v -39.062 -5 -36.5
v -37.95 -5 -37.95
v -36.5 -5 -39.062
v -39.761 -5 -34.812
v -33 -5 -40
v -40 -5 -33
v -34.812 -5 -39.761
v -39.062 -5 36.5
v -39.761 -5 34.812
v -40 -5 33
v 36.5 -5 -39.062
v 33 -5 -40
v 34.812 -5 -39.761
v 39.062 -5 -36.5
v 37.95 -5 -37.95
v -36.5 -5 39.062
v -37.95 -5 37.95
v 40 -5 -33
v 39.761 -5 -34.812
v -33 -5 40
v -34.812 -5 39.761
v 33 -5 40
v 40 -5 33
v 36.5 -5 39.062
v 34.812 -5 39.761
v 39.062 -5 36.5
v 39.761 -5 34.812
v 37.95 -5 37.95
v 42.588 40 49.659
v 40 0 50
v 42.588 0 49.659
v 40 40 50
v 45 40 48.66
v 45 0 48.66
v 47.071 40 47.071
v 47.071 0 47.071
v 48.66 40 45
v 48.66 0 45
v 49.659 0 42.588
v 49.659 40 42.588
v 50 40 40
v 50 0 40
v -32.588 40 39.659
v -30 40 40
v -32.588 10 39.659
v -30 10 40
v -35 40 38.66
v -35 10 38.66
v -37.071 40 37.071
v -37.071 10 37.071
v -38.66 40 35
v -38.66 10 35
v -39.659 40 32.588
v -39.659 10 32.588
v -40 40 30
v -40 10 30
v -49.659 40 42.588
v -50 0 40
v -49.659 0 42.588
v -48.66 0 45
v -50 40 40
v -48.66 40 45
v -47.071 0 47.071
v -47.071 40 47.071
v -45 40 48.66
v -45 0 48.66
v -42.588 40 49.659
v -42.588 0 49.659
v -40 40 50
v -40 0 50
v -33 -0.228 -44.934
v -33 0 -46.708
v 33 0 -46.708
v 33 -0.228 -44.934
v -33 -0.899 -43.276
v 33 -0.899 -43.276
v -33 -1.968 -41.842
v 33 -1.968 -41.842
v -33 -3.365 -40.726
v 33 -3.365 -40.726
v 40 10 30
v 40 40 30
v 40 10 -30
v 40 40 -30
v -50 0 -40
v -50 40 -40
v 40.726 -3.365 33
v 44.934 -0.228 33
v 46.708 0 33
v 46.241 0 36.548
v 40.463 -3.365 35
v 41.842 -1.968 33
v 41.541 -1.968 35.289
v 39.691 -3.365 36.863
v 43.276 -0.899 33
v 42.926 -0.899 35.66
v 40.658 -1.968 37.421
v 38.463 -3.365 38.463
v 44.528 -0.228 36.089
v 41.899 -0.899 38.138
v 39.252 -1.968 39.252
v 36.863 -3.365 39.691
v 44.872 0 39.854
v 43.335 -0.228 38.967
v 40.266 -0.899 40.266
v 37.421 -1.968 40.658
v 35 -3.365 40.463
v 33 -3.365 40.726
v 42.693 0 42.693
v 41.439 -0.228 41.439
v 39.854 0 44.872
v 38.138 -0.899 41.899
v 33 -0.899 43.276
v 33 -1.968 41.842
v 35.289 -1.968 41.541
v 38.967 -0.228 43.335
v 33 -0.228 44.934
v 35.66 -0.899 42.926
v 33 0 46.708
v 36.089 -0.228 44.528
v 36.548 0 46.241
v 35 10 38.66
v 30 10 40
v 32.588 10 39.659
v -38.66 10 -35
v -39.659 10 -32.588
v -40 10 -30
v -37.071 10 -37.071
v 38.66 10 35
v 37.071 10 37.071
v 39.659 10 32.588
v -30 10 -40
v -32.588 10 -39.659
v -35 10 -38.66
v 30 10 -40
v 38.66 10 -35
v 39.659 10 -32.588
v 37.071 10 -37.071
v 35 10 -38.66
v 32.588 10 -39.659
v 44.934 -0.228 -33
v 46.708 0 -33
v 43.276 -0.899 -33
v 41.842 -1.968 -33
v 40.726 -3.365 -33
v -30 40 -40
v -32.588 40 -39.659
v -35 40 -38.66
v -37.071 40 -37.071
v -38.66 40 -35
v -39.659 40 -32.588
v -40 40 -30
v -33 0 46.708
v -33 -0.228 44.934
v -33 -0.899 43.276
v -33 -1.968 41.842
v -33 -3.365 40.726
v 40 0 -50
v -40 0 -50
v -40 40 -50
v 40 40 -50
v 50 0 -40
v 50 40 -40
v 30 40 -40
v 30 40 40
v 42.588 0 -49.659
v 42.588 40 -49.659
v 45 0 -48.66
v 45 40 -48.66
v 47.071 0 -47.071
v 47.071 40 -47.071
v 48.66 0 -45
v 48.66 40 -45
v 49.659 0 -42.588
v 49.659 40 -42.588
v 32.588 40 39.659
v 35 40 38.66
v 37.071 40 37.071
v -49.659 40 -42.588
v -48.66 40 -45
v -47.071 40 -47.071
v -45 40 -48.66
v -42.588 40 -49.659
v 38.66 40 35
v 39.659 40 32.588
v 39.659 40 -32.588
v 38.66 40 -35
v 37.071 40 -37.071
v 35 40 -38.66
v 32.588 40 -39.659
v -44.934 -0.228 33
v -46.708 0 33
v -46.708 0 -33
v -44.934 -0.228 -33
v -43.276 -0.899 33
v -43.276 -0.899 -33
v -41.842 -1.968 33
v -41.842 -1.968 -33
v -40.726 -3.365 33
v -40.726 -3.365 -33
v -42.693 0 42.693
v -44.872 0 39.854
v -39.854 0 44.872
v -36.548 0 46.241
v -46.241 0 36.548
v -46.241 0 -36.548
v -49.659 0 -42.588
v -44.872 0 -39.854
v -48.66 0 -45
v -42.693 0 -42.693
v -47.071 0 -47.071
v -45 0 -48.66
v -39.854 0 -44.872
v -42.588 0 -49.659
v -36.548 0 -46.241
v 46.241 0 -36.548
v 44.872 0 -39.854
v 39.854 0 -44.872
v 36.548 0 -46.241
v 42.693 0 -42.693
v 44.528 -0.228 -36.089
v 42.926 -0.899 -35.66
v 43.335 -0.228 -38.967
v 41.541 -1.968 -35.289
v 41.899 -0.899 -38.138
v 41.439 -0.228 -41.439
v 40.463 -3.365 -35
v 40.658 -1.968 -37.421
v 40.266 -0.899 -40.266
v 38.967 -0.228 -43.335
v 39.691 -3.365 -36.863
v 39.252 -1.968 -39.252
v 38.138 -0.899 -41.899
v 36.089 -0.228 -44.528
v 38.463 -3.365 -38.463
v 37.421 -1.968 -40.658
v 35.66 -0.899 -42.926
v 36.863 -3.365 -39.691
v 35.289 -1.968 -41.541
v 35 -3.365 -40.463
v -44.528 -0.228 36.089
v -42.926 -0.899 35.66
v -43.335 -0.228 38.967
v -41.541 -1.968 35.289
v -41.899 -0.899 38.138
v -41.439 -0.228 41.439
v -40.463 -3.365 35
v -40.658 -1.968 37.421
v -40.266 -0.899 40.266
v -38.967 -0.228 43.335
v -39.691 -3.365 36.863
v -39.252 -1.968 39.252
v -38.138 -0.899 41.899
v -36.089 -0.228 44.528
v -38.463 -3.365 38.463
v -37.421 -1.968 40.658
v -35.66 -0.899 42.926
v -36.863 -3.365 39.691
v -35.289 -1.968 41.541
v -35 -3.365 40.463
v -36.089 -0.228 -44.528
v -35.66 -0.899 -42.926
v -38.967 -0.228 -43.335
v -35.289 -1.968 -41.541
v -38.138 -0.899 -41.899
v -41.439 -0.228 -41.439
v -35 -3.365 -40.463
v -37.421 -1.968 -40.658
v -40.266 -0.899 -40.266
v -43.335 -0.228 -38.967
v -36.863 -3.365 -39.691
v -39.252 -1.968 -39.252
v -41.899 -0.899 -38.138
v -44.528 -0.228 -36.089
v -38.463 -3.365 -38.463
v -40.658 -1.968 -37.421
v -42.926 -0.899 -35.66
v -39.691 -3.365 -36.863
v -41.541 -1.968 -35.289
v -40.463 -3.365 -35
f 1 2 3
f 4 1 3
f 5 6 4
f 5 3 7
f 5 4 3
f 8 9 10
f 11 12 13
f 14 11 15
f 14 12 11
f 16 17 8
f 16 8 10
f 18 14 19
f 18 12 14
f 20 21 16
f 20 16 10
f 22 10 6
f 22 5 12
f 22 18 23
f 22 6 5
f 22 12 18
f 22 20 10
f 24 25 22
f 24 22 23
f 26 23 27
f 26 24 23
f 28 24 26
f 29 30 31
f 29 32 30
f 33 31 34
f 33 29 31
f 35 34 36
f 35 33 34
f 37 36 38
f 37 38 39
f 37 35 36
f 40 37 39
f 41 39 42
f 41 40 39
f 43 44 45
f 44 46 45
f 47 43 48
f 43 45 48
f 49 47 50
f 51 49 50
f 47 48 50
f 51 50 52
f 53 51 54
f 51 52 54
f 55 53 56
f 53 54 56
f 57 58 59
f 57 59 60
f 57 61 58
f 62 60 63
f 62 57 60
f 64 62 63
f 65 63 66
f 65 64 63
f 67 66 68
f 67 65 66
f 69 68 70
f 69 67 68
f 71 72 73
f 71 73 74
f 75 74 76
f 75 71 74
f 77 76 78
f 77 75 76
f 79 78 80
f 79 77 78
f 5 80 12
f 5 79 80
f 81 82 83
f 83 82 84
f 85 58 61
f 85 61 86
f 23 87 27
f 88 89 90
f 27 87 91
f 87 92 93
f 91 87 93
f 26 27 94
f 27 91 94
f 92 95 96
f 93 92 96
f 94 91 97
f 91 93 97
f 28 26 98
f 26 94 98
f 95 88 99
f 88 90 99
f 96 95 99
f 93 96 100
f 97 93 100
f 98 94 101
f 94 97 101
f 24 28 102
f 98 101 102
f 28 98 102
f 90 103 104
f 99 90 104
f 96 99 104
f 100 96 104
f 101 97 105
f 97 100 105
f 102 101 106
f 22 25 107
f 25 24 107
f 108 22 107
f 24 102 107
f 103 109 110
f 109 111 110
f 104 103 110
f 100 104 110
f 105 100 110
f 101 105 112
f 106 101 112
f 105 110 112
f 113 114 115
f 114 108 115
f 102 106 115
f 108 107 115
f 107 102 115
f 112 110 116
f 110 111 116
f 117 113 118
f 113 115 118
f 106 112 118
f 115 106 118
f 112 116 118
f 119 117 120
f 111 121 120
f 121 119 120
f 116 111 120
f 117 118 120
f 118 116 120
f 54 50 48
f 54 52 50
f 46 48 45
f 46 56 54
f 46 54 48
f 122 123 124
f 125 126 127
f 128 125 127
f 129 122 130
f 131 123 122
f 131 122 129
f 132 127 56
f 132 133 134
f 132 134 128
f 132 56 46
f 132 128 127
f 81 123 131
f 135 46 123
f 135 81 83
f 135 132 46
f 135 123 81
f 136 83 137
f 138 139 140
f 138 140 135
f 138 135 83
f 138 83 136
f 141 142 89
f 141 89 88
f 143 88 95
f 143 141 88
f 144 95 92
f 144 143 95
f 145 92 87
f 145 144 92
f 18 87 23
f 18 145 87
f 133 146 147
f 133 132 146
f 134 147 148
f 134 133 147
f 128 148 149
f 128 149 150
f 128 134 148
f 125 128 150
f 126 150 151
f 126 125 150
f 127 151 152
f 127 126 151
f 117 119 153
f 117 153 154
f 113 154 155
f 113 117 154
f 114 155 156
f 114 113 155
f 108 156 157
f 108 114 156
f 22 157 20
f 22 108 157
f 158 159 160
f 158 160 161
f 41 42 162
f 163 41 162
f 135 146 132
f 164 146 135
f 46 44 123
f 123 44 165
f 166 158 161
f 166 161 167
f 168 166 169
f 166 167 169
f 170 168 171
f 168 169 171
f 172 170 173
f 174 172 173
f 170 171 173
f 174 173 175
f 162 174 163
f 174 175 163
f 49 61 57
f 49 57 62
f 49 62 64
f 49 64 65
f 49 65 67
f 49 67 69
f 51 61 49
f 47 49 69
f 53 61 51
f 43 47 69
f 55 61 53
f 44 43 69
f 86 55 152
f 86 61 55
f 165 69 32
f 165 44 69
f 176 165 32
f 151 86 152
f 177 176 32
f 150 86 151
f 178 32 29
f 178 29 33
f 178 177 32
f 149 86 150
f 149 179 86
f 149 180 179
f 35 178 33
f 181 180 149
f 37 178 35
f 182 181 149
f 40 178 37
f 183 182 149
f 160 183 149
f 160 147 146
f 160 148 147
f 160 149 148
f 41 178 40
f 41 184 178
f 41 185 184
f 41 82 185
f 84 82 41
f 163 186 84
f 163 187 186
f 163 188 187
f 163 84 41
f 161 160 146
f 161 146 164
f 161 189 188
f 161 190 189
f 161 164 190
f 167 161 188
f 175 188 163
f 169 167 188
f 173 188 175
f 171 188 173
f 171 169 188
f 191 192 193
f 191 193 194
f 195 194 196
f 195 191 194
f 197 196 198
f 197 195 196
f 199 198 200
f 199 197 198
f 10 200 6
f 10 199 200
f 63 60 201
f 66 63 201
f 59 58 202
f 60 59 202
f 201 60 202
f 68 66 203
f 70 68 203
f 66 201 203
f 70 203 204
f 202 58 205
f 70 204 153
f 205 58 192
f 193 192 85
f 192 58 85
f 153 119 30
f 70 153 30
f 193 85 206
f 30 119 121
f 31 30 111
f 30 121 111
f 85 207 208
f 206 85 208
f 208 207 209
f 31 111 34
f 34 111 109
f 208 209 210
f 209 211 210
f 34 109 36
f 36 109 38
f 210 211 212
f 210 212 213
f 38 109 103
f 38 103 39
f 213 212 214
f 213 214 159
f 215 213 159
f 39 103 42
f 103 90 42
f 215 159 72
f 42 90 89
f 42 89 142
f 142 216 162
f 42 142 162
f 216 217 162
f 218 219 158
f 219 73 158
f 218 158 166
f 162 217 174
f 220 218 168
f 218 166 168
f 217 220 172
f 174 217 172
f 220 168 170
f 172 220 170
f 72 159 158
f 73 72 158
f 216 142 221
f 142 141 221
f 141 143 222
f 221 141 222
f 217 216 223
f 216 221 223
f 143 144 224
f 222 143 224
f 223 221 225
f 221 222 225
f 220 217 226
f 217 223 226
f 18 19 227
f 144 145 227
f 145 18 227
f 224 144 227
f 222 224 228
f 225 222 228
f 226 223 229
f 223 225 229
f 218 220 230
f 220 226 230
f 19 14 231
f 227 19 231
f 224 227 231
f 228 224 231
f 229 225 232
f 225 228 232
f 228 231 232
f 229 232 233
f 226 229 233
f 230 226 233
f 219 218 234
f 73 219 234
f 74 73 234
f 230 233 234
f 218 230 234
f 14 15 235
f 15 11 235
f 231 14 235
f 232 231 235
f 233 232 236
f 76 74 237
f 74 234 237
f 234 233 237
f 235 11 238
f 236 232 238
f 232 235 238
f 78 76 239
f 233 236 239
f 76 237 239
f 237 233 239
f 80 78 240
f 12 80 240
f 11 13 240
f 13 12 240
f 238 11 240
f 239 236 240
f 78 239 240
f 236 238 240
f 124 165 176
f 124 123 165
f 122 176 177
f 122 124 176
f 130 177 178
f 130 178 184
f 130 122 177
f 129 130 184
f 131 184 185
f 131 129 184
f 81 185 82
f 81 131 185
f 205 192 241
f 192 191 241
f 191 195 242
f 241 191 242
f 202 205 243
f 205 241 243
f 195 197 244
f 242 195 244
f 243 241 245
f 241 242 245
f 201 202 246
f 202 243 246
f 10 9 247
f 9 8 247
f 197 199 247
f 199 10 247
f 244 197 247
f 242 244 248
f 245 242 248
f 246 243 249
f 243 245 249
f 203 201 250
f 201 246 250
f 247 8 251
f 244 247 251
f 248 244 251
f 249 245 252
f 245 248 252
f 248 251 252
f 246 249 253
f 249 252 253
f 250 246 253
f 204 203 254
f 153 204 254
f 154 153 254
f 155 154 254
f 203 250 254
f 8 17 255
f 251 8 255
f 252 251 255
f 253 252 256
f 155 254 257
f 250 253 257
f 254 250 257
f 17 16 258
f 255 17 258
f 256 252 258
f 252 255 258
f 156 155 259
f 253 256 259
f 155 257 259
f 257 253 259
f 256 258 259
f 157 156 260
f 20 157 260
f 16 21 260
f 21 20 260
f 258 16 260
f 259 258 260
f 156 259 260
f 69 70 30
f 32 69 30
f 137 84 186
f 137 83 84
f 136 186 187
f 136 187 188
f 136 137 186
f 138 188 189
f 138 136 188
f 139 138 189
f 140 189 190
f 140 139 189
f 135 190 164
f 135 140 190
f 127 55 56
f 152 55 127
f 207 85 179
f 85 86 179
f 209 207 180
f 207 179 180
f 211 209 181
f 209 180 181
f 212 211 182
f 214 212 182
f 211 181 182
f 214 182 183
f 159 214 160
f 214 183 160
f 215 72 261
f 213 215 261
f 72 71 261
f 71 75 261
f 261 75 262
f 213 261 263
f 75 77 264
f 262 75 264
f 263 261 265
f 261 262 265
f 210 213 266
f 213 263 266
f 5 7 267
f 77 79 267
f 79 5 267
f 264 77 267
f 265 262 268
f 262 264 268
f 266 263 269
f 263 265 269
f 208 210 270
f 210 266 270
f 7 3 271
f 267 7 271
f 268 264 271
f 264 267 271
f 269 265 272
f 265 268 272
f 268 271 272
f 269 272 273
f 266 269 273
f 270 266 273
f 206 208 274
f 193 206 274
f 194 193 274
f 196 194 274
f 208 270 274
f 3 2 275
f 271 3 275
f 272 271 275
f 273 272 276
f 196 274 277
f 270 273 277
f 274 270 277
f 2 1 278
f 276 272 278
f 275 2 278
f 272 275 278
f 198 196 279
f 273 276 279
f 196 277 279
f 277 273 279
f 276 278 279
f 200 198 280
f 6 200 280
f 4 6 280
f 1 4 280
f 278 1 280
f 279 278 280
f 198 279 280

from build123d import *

# Parameters (mm, degrees)
SKETCH1_W           = 100
SKETCH1_H           = 100
BOSS_EXTRUDE1_DEPTH = 40
SKETCH2_W           = 80
SKETCH2_H           = 80
CUT_EXTRUDE1_DEPTH  = 30
SKETCH3_W           = 80
SKETCH3_H           = 80
BOSS_EXTRUDE2_DEPTH = 5
FILLET2_R           = 10
FILLET4_R           = 7
FILLET5_R           = 7


with BuildPart() as part:
    # Sketch1 → Boss-Extrude1 (new body)
    with BuildSketch(Plane(origin=(0, 0, 0), x_dir=(1, 0, 0), z_dir=(0, 1, 0))):
        Rectangle(SKETCH1_W, SKETCH1_H)
    extrude(amount=BOSS_EXTRUDE1_DEPTH)

    # Sketch2 → Cut-Extrude1 (cut)
    with BuildSketch(Plane(origin=(0, 40, 0), x_dir=(1, 0, 0), z_dir=(0, 1, 0))):
        Rectangle(SKETCH2_W, SKETCH2_H)
    extrude(amount=-CUT_EXTRUDE1_DEPTH, mode=Mode.SUBTRACT)

    # Sketch3 → Boss-Extrude2 (add)
    with BuildSketch(Plane.XZ):
        Rectangle(SKETCH3_W, SKETCH3_H)
    extrude(amount=BOSS_EXTRUDE2_DEPTH)

    # Fillet2
    fillet2_edges = [part.edges().sort_by_distance(p)[0] for p in [
        (-40, 25, 40),
        (-40, 25, -40),
        (40, 25, -40),
        (40, 25, 40),
        (-50, 20, -50),
        (50, 20, -50),
        (50, 20, 50),
        (-50, 20, 50),
    ]]
    fillet(fillet2_edges, radius=FILLET2_R)

    # Fillet4
    fillet4_edges = [part.edges().sort_by_distance(p)[0] for p in [
        (-40, -2.5, 40),
        (-40, -2.5, -40),
        (40, -2.5, -40),
        (40, -2.5, 40),
    ]]
    fillet(fillet4_edges, radius=FILLET4_R)

    # Fillet5
    # the kernel refuses this fillet: 7 mm, written as the material it adds along each edge
    with BuildSketch(Plane(origin=(-33, 0, 33), x_dir=(-1, 0, 0), z_dir=(0, 0, -1))) as fillet5_piece_1:
        with BuildLine():
            CenterArc((13.708203932, -7), FILLET5_R, 90, 73.398450401)
            Line((7, -5), (6.865835921, -4.96))
            ThreePointArc((6.865835921, -4.96), (6.86, -2.5), (6.86, 0))
            Line((6.86, 0), (7, 0.14))
            Line((7, 0.14), (13.708203932, 0.14))
            Line((13.708203932, 0.14), (13.708203932, 0))
        make_face()
    revolve(axis=Axis((-33, 0, 33), (0, 1, 0)), revolution_arc=90)
    with BuildSketch(Plane(origin=(33, 0, 40), x_dir=(0, 0, 1), z_dir=(-1, 0, 0)), Plane(origin=(40, 0, -33), x_dir=(1, 0, 0), z_dir=(0, 0, 1)), Plane(origin=(-33, 0, -40), x_dir=(0, 0, -1), z_dir=(1, 0, 0)), Plane(origin=(-40, 0, 33), x_dir=(-1, 0, 0), z_dir=(0, 0, -1))) as fillet5_piece_2:
        with BuildLine():
            CenterArc((6.708203932, -7), FILLET5_R, 90, 73.398450401)
            Line((0, -5), (-0.134164079, -4.96))
            ThreePointArc((-0.134164079, -4.96), (-0.14, -2.5), (-0.14, 0))
            Line((-0.14, 0), (0, 0.14))
            Line((0, 0.14), (6.708203932, 0.14))
            Line((6.708203932, 0.14), (6.708203932, 0))
        make_face()
    extrude(amount=66)
    with BuildSketch(Plane(origin=(33, 0, 33), x_dir=(1, 0, 0), z_dir=(0, 0, -1))) as fillet5_piece_3:
        with BuildLine():
            CenterArc((13.708203932, 7), FILLET5_R, 196.601549599, 73.398450401)
            Line((7, 5), (6.865835921, 4.96))
            ThreePointArc((6.865835921, 4.96), (6.86, 2.5), (6.86, 0))
            Line((6.86, 0), (7, -0.14))
            Line((7, -0.14), (13.708203932, -0.14))
            Line((13.708203932, -0.14), (13.708203932, 0))
        make_face()
    revolve(axis=Axis((33, 0, 33), (0, -1, 0)), revolution_arc=90)
    with BuildSketch(Plane(origin=(33, 0, -33), x_dir=(1, 0, 0), z_dir=(0, 0, 1))) as fillet5_piece_4:
        with BuildLine():
            CenterArc((13.708203932, -7), FILLET5_R, 90, 73.398450401)
            Line((7, -5), (6.865835921, -4.96))
            ThreePointArc((6.865835921, -4.96), (6.86, -2.5), (6.86, 0))
            Line((6.86, 0), (7, 0.14))
            Line((7, 0.14), (13.708203932, 0.14))
            Line((13.708203932, 0.14), (13.708203932, 0))
        make_face()
    revolve(axis=Axis((33, 0, -33), (0, 1, 0)), revolution_arc=90)
    with BuildSketch(Plane(origin=(-33, 0, -33), x_dir=(0, 0, -1), z_dir=(1, 0, 0))) as fillet5_piece_5:
        with BuildLine():
            CenterArc((13.708203932, -7), FILLET5_R, 90, 73.398450401)
            Line((7, -5), (6.865835921, -4.96))
            ThreePointArc((6.865835921, -4.96), (6.86, -2.5), (6.86, 0))
            Line((6.86, 0), (7, 0.14))
            Line((7, 0.14), (13.708203932, 0.14))
            Line((13.708203932, 0.14), (13.708203932, 0))
        make_face()
    revolve(axis=Axis((-33, 0, -33), (0, 1, 0)), revolution_arc=90)


solid = part.part
